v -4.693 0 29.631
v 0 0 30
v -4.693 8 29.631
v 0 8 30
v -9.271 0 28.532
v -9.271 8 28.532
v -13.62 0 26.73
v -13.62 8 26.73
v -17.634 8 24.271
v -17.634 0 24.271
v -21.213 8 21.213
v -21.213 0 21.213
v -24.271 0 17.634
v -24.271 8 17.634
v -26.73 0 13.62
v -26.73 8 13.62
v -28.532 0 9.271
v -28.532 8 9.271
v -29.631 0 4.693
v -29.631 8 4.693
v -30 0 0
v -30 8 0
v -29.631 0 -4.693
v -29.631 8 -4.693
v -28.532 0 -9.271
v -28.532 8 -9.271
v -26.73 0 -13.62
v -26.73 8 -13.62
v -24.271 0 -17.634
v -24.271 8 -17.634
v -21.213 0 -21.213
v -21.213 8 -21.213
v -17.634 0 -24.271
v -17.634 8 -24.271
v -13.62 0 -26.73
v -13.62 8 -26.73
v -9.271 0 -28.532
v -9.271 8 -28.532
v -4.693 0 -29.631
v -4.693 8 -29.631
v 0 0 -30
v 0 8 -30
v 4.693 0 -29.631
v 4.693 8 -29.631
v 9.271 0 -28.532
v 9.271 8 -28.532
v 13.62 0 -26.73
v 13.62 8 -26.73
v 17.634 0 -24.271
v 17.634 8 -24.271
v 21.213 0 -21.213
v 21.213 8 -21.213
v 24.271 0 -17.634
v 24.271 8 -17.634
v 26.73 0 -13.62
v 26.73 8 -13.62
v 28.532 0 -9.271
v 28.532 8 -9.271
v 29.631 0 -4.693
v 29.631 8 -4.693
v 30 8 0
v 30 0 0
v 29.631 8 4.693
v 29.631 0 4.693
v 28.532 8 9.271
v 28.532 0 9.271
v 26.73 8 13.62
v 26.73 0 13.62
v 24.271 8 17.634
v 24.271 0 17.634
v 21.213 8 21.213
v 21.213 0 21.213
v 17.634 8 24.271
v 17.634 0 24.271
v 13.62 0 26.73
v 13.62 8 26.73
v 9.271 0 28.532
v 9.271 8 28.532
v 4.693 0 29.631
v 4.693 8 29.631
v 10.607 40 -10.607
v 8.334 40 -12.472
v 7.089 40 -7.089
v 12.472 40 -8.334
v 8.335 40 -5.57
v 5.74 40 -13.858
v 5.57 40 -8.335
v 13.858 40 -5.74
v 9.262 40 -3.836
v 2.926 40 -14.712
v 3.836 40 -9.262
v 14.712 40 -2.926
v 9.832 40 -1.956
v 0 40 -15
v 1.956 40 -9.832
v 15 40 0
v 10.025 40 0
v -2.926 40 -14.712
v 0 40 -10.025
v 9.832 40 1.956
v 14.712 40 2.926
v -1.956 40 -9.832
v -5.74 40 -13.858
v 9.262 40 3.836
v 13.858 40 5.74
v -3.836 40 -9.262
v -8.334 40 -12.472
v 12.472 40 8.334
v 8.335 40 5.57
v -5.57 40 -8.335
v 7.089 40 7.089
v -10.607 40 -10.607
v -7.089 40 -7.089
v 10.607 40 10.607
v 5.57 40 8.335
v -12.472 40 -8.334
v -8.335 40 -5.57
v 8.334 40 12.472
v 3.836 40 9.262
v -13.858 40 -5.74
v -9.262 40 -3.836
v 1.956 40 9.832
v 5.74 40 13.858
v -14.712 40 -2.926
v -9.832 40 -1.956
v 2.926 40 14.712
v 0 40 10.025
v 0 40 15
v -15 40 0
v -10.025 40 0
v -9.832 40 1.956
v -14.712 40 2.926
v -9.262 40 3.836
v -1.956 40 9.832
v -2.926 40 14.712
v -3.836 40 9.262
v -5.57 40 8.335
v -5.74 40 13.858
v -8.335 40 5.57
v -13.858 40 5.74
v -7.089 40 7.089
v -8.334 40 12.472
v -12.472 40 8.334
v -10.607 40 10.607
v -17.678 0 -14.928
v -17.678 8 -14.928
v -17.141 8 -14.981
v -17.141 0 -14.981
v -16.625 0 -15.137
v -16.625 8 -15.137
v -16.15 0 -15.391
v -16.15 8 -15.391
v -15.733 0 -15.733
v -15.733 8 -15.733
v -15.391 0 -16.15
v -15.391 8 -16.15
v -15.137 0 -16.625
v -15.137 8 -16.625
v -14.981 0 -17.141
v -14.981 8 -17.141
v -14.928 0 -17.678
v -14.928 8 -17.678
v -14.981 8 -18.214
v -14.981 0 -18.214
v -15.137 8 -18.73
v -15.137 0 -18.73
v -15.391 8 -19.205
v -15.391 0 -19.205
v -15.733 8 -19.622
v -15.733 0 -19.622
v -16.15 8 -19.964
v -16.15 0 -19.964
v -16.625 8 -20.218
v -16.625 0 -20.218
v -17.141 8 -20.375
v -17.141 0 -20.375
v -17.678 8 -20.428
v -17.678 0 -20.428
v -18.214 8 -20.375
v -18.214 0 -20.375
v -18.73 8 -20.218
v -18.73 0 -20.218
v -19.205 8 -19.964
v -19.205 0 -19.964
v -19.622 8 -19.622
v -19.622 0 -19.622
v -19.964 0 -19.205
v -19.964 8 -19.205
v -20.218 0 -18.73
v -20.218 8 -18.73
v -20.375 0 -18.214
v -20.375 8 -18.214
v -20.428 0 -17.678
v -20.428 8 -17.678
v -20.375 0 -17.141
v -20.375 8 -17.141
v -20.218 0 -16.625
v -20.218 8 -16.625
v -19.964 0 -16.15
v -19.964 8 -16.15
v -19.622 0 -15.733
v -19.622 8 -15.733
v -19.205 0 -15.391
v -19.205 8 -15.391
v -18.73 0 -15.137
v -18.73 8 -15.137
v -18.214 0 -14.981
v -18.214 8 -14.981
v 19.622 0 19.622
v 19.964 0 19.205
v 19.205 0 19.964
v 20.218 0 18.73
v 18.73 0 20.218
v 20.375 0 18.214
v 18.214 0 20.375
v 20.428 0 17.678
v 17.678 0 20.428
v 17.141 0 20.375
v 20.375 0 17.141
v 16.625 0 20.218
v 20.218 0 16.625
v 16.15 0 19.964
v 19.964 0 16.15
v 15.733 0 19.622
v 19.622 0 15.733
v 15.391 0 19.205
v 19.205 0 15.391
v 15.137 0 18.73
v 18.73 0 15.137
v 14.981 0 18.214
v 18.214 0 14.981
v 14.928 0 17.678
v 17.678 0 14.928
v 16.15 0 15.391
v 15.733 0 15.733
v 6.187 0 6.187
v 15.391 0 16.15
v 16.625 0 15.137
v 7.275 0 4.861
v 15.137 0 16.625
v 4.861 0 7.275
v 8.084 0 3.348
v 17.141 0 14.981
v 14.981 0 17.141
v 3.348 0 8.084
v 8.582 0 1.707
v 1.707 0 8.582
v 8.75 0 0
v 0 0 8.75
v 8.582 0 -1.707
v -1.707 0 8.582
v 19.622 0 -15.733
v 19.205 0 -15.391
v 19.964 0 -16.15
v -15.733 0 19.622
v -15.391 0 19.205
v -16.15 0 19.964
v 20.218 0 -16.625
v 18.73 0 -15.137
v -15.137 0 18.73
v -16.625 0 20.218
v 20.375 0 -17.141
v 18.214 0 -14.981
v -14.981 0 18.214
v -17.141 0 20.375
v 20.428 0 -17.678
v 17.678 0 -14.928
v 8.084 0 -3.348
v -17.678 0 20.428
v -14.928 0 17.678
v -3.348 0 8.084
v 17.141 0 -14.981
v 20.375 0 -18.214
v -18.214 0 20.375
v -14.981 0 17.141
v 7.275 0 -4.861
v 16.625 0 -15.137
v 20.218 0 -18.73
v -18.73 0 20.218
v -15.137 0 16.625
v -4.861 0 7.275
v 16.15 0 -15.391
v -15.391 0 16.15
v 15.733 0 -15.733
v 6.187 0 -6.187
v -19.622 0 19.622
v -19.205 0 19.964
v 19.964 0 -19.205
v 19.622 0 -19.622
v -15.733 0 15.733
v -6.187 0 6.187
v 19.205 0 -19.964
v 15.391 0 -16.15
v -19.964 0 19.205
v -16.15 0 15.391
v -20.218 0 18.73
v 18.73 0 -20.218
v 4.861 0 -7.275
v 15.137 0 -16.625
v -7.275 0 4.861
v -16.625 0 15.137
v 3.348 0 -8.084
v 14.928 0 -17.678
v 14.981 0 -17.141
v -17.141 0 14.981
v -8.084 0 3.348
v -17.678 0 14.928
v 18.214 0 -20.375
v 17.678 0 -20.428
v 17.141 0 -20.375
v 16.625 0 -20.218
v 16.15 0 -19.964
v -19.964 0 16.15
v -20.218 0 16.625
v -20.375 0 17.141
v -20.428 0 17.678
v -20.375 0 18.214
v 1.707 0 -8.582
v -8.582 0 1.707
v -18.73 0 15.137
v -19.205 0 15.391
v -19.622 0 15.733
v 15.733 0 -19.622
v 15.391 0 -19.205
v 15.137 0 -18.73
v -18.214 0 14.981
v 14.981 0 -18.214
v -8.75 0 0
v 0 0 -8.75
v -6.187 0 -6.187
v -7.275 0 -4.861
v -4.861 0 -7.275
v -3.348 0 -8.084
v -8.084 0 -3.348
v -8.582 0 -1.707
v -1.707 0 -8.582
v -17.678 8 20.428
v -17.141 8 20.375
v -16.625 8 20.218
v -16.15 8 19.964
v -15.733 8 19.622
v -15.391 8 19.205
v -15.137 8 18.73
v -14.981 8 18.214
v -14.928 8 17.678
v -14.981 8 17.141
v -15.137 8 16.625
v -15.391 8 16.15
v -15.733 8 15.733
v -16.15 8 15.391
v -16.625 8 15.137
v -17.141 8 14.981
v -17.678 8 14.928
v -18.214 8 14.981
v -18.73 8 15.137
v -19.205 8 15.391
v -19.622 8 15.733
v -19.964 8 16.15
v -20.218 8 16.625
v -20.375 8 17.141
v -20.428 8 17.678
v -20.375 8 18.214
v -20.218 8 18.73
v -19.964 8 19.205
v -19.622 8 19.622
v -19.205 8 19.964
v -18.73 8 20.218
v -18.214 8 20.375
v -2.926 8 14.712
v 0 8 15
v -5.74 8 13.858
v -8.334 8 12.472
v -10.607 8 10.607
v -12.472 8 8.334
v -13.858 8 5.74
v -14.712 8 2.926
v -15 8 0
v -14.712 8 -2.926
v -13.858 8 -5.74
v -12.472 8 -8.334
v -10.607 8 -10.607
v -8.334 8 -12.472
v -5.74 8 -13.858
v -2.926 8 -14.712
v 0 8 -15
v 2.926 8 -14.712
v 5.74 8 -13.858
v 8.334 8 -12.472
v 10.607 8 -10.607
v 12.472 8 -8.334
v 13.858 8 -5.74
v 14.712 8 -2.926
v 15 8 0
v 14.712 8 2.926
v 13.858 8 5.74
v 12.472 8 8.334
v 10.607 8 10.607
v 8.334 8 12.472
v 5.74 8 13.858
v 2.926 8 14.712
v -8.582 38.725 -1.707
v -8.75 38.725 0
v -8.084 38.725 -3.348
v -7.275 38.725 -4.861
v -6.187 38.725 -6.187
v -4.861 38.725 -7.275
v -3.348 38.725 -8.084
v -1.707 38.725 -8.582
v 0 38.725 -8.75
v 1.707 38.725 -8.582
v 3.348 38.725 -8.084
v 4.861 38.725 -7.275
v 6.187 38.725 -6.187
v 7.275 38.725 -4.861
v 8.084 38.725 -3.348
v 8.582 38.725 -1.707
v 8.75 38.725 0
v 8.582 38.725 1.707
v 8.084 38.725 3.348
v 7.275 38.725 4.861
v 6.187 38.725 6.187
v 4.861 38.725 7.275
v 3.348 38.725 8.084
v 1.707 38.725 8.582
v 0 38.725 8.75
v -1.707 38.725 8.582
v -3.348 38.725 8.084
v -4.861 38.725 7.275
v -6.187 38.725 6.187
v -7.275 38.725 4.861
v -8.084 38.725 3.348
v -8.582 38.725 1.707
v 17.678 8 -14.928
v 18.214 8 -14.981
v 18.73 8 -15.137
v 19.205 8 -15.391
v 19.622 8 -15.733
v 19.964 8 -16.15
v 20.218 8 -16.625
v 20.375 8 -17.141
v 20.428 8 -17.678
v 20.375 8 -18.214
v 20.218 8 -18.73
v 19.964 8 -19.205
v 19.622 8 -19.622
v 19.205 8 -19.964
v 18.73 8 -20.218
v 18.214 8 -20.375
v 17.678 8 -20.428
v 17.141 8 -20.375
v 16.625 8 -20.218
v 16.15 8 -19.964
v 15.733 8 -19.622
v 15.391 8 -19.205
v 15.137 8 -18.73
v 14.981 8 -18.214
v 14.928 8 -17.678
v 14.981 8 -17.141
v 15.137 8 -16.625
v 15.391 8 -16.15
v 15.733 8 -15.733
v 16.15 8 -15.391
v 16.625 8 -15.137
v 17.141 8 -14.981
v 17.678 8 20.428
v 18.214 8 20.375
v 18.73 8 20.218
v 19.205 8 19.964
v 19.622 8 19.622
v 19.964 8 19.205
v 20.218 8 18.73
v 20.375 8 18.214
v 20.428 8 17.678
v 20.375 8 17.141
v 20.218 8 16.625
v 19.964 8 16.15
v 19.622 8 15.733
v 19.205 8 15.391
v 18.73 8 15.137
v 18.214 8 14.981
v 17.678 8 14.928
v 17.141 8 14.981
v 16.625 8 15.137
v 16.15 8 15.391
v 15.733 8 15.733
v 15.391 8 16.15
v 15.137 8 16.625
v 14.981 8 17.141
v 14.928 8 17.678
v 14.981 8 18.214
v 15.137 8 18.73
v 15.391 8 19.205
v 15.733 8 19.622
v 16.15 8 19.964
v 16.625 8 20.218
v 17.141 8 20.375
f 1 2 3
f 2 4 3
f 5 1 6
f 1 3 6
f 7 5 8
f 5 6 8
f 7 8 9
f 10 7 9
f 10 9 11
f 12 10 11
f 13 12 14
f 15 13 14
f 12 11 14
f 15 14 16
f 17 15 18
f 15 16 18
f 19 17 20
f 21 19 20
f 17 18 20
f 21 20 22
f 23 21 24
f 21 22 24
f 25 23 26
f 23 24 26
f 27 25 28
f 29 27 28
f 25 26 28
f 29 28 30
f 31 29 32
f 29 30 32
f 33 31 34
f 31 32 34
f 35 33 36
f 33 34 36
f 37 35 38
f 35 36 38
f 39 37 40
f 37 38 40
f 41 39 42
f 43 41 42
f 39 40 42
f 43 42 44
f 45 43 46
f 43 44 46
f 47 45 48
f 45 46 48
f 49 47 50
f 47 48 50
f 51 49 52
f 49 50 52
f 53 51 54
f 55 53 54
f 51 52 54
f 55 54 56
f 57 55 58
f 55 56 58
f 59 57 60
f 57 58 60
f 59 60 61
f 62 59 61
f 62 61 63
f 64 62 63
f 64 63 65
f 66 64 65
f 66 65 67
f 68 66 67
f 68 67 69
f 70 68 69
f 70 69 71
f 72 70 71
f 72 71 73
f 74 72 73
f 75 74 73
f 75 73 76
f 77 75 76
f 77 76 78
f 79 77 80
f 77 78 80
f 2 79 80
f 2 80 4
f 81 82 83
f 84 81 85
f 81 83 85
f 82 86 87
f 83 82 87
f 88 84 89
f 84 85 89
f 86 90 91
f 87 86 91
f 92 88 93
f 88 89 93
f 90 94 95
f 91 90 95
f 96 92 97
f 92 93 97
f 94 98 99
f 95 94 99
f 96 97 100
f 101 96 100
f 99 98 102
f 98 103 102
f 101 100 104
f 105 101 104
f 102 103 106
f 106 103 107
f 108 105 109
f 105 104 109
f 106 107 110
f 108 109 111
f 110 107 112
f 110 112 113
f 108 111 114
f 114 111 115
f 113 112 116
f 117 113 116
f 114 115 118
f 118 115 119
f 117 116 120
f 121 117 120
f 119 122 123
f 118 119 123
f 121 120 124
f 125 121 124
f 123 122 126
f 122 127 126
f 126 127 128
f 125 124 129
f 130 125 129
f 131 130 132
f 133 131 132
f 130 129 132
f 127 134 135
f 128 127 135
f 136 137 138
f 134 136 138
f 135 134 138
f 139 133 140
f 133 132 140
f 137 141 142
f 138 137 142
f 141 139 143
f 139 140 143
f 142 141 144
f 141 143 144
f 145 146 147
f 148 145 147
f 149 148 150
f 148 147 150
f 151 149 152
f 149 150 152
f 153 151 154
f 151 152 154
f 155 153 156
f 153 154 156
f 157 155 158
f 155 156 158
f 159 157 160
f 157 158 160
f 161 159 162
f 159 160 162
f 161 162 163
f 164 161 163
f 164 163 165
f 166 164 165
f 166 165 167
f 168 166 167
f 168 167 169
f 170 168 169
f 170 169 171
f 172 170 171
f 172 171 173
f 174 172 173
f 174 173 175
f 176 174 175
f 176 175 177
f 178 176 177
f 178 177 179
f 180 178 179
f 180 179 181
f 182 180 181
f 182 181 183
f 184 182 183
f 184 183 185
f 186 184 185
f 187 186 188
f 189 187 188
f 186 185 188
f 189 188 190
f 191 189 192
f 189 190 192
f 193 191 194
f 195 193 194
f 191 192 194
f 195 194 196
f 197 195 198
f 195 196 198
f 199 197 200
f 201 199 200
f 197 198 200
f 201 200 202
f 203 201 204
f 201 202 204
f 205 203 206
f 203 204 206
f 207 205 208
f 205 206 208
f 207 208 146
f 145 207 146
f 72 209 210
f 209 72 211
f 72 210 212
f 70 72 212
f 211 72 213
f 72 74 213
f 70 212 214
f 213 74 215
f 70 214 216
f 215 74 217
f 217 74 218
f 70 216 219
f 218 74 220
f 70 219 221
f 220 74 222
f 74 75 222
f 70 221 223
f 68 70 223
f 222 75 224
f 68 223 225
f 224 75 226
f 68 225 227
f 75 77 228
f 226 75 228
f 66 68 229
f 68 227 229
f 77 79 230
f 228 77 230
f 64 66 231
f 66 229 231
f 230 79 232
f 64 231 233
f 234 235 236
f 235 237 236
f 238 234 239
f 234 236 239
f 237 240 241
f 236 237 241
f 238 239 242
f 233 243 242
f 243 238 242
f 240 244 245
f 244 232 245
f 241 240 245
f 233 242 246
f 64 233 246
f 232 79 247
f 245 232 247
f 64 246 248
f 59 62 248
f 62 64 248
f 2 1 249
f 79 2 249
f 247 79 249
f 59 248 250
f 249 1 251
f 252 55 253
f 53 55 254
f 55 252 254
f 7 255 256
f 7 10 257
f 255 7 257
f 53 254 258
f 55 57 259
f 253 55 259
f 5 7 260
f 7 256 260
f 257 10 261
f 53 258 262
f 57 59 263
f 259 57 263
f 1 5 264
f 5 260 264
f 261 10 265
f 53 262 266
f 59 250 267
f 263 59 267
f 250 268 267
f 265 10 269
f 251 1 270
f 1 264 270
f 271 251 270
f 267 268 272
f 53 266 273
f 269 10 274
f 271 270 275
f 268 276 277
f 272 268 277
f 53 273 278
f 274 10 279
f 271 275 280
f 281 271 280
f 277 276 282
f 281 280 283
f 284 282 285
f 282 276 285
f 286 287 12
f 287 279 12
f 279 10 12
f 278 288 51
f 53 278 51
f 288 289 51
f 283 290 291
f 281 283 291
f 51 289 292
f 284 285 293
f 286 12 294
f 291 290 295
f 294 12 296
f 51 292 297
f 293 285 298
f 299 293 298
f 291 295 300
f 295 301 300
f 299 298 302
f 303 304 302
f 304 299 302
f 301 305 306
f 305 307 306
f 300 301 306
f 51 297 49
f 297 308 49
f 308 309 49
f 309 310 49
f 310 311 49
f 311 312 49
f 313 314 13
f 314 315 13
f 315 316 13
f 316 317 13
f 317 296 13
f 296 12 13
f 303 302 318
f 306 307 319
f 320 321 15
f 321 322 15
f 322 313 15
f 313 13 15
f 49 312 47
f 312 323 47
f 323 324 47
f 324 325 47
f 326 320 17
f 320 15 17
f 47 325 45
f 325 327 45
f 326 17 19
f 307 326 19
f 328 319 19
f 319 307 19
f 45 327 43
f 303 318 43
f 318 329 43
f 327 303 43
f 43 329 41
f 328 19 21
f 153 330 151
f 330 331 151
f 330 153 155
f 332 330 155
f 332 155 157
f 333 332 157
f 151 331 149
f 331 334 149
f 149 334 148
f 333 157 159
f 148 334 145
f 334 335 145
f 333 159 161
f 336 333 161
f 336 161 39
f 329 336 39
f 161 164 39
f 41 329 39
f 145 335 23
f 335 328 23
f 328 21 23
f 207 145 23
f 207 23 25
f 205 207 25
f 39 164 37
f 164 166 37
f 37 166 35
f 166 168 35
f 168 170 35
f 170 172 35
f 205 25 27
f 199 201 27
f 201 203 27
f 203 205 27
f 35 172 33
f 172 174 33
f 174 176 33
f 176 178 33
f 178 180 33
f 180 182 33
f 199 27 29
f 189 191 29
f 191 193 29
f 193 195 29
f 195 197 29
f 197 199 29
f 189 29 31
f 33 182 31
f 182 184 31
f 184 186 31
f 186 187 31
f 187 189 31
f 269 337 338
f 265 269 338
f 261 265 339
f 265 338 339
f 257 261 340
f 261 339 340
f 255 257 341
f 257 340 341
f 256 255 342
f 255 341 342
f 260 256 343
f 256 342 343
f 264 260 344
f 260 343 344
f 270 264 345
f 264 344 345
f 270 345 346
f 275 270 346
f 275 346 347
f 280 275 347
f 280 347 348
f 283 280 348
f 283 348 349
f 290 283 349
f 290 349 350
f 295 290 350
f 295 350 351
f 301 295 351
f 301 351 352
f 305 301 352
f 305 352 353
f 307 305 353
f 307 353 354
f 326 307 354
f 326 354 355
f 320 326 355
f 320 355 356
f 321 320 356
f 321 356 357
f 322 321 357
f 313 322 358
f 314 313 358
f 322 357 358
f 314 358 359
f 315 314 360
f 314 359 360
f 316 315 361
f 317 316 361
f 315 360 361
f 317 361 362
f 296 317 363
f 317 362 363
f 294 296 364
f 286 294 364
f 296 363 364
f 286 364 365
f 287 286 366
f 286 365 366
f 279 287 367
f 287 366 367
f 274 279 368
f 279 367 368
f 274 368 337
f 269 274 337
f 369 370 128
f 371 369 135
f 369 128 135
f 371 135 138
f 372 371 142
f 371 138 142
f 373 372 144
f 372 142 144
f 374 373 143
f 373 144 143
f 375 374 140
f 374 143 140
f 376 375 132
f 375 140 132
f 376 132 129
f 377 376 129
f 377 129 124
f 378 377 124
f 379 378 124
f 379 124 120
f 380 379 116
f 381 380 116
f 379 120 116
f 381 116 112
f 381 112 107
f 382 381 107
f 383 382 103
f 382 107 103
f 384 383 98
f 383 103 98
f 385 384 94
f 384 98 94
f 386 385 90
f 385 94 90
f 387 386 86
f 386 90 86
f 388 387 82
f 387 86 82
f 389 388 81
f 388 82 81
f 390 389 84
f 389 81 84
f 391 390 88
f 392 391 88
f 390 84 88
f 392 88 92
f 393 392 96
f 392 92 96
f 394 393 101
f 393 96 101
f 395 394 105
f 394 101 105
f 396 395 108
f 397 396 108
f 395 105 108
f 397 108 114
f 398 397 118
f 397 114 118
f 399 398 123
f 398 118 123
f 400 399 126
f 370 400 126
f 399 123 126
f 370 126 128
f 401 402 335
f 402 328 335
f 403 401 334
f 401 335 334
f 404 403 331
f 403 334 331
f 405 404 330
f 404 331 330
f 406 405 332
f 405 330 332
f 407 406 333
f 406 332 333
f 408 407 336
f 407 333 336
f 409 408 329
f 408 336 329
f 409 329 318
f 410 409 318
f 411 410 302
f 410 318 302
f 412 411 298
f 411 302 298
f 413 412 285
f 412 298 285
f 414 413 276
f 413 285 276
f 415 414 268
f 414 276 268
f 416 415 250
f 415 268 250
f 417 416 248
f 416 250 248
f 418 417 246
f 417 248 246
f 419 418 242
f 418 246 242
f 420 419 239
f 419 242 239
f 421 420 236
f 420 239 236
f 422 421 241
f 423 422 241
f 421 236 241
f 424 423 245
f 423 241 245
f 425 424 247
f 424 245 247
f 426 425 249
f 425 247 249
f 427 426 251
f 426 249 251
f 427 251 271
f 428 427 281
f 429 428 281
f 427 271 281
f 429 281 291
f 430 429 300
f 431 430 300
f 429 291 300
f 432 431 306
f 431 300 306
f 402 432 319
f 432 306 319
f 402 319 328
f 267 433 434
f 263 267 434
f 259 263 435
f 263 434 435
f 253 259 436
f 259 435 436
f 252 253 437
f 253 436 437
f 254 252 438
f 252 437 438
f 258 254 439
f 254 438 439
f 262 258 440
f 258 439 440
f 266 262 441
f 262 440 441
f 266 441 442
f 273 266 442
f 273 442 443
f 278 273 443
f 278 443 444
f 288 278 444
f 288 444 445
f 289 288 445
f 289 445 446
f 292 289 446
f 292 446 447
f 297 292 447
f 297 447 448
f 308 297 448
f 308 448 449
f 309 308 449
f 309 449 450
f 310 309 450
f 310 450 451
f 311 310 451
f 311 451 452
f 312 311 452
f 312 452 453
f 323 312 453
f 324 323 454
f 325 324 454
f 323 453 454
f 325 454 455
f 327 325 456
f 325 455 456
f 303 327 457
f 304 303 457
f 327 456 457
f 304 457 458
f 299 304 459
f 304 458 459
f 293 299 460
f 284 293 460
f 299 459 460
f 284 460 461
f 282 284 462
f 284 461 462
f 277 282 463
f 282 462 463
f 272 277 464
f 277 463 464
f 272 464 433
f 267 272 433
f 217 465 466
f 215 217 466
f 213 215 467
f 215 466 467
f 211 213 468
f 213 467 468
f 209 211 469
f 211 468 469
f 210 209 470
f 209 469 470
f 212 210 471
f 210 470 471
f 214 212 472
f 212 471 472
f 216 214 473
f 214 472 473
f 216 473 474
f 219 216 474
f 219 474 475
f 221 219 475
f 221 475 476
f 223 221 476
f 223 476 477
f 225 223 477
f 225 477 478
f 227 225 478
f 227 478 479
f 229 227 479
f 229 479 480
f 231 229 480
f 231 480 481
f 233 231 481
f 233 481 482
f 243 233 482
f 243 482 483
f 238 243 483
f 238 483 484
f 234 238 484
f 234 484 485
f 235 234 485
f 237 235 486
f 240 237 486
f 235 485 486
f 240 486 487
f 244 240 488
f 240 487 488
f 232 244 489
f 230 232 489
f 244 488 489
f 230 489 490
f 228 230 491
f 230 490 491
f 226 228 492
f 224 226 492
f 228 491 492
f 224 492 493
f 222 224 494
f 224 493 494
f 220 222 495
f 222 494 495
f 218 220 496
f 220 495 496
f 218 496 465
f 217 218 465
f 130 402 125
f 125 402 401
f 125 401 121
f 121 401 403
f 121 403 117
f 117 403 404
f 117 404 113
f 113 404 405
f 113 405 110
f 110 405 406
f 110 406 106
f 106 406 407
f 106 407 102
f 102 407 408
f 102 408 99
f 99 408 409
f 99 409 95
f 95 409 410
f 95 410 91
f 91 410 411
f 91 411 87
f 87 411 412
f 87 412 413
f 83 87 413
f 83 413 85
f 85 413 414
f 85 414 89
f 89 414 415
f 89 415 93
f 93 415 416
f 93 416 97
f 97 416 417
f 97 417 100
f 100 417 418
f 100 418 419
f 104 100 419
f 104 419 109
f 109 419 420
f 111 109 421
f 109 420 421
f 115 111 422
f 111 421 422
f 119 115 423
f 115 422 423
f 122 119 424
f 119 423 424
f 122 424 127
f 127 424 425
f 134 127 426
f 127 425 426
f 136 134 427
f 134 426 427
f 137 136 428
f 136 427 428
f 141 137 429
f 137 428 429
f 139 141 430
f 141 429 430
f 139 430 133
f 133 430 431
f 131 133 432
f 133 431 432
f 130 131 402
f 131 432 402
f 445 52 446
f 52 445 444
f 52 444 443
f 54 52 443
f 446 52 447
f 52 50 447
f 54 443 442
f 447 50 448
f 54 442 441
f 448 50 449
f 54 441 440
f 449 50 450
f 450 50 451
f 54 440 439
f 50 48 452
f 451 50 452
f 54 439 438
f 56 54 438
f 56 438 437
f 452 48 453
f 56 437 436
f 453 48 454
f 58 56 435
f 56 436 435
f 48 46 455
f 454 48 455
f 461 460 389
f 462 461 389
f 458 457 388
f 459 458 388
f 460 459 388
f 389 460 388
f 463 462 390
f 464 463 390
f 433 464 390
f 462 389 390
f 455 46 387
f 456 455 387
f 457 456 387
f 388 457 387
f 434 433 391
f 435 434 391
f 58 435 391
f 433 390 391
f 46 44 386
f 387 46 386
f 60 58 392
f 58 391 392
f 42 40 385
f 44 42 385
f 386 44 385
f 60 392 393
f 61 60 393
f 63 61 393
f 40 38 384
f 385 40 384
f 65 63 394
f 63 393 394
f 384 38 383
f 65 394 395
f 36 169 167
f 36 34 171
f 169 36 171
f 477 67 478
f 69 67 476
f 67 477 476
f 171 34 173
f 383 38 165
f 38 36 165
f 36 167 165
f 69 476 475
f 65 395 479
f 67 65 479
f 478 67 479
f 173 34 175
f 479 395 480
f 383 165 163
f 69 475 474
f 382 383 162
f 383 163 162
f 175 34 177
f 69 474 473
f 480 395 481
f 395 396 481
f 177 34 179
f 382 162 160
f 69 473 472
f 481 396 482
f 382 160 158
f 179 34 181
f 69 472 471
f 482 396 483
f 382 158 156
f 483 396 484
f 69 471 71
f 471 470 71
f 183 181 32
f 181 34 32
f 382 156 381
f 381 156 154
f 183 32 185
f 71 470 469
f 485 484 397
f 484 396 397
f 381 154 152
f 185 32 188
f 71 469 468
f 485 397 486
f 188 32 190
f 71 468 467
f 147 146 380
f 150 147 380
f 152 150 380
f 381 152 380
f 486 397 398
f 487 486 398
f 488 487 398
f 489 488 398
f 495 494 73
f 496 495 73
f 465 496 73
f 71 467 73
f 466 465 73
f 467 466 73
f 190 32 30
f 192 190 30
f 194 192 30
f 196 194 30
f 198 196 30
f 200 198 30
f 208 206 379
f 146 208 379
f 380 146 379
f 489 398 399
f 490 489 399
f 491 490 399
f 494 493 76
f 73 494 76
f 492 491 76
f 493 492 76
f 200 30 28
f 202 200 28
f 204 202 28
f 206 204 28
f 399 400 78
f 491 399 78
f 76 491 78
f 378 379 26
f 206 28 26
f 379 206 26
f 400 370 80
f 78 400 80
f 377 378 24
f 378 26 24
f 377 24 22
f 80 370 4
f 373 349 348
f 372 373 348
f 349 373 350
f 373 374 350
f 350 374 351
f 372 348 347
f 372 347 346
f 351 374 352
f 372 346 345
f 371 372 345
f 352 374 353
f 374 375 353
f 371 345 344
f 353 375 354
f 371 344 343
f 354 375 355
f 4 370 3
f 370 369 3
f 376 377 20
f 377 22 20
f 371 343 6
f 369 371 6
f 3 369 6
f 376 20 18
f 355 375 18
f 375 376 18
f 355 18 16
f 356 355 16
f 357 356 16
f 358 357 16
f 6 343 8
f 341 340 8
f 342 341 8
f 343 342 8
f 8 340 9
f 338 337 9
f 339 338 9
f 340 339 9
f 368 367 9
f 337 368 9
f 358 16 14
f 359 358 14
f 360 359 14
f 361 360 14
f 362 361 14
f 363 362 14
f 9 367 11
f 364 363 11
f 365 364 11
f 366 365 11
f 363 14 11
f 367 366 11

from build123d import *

# Parameters (mm, degrees)
HOLE_WIZARD_M201_D           = 17.5
HOLE_WIZARD_M201_CSINK_D     = 20.05
HOLE_WIZARD_M201_CSINK_ANGLE = 90
SKETCH_4_R                   = 2.75
CUT_EXTRUDE_1_DEPTH          = 54.141321022


with BuildPart() as part:
    # Эскиз1 → Повернуть1 (revolve)
    with BuildSketch(Plane.XY):
        Polygon((0, 0), (-30, 0), (-30, 8), (-15, 8), (-15, 40), (0, 40), align=None)
    revolve(axis=Axis((0, 20.983482592, 0), (0, -1, 0)))

    # Отверстие обработанное метчиком M201 (through all)
    with Locations(Plane(origin=(0, 40, 0), x_dir=(1, 0, 0), z_dir=(0, 1, 0))):
        with Locations((0, 0)):
            CounterSinkHole(HOLE_WIZARD_M201_D / 2, HOLE_WIZARD_M201_CSINK_D / 2, counter_sink_angle=HOLE_WIZARD_M201_CSINK_ANGLE)

    # Эскиз4 → Вырез-Вытянуть1 (cut, through all)
    with BuildSketch(Plane(origin=(0, 8, 0), x_dir=(1, 0, 0), z_dir=(0, 1, 0))):
        with Locations((-17.67766953, 17.67766953)):
            Circle(SKETCH_4_R)
        with Locations((-17.67766953, -17.67766953)):
            Circle(SKETCH_4_R)
        with Locations((17.67766953, 17.67766953)):
            Circle(SKETCH_4_R)
        with Locations((17.67766953, -17.67766953)):
            Circle(SKETCH_4_R)
    extrude(amount=-CUT_EXTRUDE_1_DEPTH, mode=Mode.SUBTRACT)


solid = part.part
